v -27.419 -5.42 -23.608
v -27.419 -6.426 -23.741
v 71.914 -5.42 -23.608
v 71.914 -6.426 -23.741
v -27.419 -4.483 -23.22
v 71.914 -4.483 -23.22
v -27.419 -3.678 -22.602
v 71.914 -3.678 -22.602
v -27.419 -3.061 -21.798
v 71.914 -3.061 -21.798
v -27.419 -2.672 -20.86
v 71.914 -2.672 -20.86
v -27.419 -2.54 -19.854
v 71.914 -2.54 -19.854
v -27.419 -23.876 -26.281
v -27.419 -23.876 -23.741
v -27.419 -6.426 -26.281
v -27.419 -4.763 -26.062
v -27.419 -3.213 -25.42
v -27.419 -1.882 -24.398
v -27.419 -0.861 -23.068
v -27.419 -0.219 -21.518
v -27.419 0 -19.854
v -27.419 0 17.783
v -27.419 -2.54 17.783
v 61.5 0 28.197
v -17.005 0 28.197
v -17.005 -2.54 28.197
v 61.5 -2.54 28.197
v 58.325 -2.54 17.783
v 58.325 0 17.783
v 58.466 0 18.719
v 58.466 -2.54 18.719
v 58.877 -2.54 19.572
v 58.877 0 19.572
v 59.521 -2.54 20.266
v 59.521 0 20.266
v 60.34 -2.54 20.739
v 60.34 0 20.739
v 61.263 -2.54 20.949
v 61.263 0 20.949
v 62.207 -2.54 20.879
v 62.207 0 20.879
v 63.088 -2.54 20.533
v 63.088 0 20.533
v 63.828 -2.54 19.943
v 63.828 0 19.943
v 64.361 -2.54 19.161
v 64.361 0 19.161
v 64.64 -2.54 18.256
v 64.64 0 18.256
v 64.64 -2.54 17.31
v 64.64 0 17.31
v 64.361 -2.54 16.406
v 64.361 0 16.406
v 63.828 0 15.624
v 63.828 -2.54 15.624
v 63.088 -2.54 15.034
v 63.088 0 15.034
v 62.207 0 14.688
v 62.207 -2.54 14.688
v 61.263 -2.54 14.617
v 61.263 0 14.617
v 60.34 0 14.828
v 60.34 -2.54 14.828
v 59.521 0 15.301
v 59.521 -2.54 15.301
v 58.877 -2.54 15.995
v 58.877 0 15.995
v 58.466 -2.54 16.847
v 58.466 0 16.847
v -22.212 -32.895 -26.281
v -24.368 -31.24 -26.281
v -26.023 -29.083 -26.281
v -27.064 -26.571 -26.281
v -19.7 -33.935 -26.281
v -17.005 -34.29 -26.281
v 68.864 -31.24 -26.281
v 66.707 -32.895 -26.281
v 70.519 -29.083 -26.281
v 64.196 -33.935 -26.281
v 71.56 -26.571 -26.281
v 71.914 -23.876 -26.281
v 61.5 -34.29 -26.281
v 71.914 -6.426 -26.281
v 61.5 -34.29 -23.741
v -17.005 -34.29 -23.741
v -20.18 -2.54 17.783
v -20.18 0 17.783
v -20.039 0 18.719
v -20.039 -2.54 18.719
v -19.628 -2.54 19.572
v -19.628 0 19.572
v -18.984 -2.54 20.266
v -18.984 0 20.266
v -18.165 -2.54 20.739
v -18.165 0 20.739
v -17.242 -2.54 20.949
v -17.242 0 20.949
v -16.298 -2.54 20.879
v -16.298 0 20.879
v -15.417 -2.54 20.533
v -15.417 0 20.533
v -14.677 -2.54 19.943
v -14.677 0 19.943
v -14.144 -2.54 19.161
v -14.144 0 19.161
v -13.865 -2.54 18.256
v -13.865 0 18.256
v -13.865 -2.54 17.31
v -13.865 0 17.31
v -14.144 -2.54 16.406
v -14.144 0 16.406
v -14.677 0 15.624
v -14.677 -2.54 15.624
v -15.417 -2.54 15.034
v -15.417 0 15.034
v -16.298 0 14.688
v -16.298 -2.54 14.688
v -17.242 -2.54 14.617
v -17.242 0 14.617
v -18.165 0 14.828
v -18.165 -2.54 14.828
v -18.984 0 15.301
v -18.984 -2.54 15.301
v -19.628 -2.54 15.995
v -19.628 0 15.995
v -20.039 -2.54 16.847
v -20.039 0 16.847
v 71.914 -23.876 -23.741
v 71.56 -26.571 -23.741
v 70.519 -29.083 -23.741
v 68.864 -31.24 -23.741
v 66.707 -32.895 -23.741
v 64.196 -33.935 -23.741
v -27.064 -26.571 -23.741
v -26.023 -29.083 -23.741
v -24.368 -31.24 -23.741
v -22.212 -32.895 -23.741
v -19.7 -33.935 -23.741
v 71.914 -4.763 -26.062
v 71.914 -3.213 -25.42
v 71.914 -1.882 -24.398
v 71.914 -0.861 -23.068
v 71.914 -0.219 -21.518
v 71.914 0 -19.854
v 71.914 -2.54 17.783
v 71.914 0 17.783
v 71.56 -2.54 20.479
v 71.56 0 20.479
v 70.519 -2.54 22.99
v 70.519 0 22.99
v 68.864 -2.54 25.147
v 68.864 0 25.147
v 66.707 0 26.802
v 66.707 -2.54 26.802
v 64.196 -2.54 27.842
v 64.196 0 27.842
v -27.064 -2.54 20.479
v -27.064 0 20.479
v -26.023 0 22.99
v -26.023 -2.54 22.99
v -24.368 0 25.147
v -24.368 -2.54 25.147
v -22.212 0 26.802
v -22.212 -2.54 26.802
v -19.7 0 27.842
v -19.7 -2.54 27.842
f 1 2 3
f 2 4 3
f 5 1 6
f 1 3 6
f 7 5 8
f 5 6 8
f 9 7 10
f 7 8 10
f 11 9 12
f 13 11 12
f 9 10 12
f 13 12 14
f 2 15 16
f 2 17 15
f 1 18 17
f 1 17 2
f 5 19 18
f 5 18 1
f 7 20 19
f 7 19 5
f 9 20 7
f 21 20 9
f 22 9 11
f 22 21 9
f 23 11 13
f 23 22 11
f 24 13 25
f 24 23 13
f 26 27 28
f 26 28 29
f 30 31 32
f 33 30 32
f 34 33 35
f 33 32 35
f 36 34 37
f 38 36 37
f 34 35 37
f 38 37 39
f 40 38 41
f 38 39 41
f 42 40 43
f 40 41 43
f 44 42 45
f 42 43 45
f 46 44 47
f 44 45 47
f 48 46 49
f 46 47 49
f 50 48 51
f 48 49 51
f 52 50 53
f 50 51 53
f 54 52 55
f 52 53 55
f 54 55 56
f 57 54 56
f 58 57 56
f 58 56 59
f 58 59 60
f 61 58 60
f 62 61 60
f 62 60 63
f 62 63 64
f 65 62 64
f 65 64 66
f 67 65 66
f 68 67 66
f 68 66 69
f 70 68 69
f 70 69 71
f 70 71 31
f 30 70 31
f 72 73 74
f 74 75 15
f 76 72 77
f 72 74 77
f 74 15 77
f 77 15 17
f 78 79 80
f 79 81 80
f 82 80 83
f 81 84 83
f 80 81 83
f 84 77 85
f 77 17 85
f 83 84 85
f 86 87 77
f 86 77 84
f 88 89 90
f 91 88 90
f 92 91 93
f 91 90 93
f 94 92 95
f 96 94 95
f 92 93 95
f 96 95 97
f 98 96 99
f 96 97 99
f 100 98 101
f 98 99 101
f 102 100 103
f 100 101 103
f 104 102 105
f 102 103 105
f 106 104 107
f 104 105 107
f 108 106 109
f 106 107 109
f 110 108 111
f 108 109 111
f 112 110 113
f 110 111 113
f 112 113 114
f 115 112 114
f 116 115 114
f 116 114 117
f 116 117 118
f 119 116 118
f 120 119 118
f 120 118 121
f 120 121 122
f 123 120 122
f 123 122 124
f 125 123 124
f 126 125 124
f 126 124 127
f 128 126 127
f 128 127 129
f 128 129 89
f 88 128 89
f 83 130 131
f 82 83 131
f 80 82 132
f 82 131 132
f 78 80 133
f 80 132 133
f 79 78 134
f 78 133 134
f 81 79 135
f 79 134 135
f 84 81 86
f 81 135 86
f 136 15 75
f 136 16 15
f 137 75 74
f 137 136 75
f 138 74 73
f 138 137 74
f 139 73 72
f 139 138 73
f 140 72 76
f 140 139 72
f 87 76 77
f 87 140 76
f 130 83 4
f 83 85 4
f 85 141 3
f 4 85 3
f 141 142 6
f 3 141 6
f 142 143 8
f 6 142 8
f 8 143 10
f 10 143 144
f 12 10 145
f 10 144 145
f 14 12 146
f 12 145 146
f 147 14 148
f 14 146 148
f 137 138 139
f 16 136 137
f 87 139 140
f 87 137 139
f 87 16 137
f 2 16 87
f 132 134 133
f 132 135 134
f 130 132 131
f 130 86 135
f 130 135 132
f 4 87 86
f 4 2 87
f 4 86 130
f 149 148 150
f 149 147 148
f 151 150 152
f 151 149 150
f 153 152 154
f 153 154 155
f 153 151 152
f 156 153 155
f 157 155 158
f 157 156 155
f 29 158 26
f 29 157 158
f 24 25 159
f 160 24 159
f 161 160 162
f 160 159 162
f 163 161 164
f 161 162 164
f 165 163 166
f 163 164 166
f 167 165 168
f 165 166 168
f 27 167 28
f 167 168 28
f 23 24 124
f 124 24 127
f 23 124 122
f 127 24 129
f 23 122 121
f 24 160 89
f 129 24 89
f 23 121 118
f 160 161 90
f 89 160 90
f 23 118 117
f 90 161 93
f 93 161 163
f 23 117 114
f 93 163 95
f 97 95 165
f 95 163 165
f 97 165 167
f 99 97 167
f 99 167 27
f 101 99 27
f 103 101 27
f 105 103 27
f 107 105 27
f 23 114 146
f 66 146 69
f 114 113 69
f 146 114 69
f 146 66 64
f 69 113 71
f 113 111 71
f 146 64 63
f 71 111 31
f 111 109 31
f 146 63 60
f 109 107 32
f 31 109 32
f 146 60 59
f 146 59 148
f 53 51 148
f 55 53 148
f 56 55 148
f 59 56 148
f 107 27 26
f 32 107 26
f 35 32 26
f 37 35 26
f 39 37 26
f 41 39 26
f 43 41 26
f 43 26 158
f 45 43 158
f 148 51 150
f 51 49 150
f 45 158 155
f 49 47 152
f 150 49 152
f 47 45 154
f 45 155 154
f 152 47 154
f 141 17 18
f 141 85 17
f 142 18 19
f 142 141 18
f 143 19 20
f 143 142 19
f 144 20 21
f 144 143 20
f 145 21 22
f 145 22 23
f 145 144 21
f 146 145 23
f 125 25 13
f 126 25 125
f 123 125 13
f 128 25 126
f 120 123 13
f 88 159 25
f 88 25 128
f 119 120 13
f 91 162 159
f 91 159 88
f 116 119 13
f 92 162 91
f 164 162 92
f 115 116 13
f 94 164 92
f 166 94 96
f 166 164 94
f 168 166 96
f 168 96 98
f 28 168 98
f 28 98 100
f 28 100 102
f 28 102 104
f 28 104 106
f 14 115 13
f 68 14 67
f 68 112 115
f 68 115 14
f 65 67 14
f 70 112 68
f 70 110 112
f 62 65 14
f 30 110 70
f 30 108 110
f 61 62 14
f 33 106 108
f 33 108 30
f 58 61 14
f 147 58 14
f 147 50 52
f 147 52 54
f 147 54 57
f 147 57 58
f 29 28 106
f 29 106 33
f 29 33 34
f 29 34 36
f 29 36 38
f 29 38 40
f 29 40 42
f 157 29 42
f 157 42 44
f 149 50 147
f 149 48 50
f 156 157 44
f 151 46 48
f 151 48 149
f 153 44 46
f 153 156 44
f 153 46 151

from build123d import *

# Parameters (mm, degrees)
F0_W     = 99.3330795318
F0_H     = 54.4778928161
F1_DEPTH = 34.29
F2_R     = 10.414
F3_R     = 6.4262
F4_T     = -2.54
F6_D     = 6.35


with BuildPart() as f1:
    # F0 (on Front) → F1 (new body)
    with BuildSketch(Plane.XZ):
        with Locations((22.2479021177, 0.9583178908)):
            Rectangle(F0_W, F0_H)
    extrude(amount=F1_DEPTH)

    # F2
    f2_edges = [f1.edges().sort_by_distance(p)[0] for p in [
        (71.914442, -17.145, 28.197264),
        (-27.418638, -17.145, 28.197264),
        (71.914442, -34.29, 0.958318),
        (-27.418638, -34.29, 0.958318),
    ]]
    fillet(f2_edges, radius=F2_R)

    # F3
    f3_edges = [f1.edges().sort_by_distance(p)[0] for p in [
        (22.247902, 0, -26.280629),
    ]]
    fillet(f3_edges, radius=F3_R)

    # F4
    f4_openings = [f1.faces().sort_by_distance(p)[0] for p in [
        (22.247902, -34.29, 0.958318),
        (22.247902, -17.145, 28.197264),
        (68.864252, -17.145, 25.147074),
        (68.864252, -31.23981, 0.958318),
        (71.914442, -12.027221, -4.073711),
        (-24.368448, -31.23981, 0.958318),
        (-24.368448, -17.145, 25.147074),
        (-27.418638, -12.027221, -4.073711),
    ]]
    offset(amount=F4_T, openings=f4_openings)

    # F6 (through all)
    with Locations(Plane.XZ.offset(2.54)):
        with Locations((-17.0046376482, 17.7832642988), (61.5004418836, 17.7832642988)):
            Hole(F6_D / 2)


solid = f1.part
